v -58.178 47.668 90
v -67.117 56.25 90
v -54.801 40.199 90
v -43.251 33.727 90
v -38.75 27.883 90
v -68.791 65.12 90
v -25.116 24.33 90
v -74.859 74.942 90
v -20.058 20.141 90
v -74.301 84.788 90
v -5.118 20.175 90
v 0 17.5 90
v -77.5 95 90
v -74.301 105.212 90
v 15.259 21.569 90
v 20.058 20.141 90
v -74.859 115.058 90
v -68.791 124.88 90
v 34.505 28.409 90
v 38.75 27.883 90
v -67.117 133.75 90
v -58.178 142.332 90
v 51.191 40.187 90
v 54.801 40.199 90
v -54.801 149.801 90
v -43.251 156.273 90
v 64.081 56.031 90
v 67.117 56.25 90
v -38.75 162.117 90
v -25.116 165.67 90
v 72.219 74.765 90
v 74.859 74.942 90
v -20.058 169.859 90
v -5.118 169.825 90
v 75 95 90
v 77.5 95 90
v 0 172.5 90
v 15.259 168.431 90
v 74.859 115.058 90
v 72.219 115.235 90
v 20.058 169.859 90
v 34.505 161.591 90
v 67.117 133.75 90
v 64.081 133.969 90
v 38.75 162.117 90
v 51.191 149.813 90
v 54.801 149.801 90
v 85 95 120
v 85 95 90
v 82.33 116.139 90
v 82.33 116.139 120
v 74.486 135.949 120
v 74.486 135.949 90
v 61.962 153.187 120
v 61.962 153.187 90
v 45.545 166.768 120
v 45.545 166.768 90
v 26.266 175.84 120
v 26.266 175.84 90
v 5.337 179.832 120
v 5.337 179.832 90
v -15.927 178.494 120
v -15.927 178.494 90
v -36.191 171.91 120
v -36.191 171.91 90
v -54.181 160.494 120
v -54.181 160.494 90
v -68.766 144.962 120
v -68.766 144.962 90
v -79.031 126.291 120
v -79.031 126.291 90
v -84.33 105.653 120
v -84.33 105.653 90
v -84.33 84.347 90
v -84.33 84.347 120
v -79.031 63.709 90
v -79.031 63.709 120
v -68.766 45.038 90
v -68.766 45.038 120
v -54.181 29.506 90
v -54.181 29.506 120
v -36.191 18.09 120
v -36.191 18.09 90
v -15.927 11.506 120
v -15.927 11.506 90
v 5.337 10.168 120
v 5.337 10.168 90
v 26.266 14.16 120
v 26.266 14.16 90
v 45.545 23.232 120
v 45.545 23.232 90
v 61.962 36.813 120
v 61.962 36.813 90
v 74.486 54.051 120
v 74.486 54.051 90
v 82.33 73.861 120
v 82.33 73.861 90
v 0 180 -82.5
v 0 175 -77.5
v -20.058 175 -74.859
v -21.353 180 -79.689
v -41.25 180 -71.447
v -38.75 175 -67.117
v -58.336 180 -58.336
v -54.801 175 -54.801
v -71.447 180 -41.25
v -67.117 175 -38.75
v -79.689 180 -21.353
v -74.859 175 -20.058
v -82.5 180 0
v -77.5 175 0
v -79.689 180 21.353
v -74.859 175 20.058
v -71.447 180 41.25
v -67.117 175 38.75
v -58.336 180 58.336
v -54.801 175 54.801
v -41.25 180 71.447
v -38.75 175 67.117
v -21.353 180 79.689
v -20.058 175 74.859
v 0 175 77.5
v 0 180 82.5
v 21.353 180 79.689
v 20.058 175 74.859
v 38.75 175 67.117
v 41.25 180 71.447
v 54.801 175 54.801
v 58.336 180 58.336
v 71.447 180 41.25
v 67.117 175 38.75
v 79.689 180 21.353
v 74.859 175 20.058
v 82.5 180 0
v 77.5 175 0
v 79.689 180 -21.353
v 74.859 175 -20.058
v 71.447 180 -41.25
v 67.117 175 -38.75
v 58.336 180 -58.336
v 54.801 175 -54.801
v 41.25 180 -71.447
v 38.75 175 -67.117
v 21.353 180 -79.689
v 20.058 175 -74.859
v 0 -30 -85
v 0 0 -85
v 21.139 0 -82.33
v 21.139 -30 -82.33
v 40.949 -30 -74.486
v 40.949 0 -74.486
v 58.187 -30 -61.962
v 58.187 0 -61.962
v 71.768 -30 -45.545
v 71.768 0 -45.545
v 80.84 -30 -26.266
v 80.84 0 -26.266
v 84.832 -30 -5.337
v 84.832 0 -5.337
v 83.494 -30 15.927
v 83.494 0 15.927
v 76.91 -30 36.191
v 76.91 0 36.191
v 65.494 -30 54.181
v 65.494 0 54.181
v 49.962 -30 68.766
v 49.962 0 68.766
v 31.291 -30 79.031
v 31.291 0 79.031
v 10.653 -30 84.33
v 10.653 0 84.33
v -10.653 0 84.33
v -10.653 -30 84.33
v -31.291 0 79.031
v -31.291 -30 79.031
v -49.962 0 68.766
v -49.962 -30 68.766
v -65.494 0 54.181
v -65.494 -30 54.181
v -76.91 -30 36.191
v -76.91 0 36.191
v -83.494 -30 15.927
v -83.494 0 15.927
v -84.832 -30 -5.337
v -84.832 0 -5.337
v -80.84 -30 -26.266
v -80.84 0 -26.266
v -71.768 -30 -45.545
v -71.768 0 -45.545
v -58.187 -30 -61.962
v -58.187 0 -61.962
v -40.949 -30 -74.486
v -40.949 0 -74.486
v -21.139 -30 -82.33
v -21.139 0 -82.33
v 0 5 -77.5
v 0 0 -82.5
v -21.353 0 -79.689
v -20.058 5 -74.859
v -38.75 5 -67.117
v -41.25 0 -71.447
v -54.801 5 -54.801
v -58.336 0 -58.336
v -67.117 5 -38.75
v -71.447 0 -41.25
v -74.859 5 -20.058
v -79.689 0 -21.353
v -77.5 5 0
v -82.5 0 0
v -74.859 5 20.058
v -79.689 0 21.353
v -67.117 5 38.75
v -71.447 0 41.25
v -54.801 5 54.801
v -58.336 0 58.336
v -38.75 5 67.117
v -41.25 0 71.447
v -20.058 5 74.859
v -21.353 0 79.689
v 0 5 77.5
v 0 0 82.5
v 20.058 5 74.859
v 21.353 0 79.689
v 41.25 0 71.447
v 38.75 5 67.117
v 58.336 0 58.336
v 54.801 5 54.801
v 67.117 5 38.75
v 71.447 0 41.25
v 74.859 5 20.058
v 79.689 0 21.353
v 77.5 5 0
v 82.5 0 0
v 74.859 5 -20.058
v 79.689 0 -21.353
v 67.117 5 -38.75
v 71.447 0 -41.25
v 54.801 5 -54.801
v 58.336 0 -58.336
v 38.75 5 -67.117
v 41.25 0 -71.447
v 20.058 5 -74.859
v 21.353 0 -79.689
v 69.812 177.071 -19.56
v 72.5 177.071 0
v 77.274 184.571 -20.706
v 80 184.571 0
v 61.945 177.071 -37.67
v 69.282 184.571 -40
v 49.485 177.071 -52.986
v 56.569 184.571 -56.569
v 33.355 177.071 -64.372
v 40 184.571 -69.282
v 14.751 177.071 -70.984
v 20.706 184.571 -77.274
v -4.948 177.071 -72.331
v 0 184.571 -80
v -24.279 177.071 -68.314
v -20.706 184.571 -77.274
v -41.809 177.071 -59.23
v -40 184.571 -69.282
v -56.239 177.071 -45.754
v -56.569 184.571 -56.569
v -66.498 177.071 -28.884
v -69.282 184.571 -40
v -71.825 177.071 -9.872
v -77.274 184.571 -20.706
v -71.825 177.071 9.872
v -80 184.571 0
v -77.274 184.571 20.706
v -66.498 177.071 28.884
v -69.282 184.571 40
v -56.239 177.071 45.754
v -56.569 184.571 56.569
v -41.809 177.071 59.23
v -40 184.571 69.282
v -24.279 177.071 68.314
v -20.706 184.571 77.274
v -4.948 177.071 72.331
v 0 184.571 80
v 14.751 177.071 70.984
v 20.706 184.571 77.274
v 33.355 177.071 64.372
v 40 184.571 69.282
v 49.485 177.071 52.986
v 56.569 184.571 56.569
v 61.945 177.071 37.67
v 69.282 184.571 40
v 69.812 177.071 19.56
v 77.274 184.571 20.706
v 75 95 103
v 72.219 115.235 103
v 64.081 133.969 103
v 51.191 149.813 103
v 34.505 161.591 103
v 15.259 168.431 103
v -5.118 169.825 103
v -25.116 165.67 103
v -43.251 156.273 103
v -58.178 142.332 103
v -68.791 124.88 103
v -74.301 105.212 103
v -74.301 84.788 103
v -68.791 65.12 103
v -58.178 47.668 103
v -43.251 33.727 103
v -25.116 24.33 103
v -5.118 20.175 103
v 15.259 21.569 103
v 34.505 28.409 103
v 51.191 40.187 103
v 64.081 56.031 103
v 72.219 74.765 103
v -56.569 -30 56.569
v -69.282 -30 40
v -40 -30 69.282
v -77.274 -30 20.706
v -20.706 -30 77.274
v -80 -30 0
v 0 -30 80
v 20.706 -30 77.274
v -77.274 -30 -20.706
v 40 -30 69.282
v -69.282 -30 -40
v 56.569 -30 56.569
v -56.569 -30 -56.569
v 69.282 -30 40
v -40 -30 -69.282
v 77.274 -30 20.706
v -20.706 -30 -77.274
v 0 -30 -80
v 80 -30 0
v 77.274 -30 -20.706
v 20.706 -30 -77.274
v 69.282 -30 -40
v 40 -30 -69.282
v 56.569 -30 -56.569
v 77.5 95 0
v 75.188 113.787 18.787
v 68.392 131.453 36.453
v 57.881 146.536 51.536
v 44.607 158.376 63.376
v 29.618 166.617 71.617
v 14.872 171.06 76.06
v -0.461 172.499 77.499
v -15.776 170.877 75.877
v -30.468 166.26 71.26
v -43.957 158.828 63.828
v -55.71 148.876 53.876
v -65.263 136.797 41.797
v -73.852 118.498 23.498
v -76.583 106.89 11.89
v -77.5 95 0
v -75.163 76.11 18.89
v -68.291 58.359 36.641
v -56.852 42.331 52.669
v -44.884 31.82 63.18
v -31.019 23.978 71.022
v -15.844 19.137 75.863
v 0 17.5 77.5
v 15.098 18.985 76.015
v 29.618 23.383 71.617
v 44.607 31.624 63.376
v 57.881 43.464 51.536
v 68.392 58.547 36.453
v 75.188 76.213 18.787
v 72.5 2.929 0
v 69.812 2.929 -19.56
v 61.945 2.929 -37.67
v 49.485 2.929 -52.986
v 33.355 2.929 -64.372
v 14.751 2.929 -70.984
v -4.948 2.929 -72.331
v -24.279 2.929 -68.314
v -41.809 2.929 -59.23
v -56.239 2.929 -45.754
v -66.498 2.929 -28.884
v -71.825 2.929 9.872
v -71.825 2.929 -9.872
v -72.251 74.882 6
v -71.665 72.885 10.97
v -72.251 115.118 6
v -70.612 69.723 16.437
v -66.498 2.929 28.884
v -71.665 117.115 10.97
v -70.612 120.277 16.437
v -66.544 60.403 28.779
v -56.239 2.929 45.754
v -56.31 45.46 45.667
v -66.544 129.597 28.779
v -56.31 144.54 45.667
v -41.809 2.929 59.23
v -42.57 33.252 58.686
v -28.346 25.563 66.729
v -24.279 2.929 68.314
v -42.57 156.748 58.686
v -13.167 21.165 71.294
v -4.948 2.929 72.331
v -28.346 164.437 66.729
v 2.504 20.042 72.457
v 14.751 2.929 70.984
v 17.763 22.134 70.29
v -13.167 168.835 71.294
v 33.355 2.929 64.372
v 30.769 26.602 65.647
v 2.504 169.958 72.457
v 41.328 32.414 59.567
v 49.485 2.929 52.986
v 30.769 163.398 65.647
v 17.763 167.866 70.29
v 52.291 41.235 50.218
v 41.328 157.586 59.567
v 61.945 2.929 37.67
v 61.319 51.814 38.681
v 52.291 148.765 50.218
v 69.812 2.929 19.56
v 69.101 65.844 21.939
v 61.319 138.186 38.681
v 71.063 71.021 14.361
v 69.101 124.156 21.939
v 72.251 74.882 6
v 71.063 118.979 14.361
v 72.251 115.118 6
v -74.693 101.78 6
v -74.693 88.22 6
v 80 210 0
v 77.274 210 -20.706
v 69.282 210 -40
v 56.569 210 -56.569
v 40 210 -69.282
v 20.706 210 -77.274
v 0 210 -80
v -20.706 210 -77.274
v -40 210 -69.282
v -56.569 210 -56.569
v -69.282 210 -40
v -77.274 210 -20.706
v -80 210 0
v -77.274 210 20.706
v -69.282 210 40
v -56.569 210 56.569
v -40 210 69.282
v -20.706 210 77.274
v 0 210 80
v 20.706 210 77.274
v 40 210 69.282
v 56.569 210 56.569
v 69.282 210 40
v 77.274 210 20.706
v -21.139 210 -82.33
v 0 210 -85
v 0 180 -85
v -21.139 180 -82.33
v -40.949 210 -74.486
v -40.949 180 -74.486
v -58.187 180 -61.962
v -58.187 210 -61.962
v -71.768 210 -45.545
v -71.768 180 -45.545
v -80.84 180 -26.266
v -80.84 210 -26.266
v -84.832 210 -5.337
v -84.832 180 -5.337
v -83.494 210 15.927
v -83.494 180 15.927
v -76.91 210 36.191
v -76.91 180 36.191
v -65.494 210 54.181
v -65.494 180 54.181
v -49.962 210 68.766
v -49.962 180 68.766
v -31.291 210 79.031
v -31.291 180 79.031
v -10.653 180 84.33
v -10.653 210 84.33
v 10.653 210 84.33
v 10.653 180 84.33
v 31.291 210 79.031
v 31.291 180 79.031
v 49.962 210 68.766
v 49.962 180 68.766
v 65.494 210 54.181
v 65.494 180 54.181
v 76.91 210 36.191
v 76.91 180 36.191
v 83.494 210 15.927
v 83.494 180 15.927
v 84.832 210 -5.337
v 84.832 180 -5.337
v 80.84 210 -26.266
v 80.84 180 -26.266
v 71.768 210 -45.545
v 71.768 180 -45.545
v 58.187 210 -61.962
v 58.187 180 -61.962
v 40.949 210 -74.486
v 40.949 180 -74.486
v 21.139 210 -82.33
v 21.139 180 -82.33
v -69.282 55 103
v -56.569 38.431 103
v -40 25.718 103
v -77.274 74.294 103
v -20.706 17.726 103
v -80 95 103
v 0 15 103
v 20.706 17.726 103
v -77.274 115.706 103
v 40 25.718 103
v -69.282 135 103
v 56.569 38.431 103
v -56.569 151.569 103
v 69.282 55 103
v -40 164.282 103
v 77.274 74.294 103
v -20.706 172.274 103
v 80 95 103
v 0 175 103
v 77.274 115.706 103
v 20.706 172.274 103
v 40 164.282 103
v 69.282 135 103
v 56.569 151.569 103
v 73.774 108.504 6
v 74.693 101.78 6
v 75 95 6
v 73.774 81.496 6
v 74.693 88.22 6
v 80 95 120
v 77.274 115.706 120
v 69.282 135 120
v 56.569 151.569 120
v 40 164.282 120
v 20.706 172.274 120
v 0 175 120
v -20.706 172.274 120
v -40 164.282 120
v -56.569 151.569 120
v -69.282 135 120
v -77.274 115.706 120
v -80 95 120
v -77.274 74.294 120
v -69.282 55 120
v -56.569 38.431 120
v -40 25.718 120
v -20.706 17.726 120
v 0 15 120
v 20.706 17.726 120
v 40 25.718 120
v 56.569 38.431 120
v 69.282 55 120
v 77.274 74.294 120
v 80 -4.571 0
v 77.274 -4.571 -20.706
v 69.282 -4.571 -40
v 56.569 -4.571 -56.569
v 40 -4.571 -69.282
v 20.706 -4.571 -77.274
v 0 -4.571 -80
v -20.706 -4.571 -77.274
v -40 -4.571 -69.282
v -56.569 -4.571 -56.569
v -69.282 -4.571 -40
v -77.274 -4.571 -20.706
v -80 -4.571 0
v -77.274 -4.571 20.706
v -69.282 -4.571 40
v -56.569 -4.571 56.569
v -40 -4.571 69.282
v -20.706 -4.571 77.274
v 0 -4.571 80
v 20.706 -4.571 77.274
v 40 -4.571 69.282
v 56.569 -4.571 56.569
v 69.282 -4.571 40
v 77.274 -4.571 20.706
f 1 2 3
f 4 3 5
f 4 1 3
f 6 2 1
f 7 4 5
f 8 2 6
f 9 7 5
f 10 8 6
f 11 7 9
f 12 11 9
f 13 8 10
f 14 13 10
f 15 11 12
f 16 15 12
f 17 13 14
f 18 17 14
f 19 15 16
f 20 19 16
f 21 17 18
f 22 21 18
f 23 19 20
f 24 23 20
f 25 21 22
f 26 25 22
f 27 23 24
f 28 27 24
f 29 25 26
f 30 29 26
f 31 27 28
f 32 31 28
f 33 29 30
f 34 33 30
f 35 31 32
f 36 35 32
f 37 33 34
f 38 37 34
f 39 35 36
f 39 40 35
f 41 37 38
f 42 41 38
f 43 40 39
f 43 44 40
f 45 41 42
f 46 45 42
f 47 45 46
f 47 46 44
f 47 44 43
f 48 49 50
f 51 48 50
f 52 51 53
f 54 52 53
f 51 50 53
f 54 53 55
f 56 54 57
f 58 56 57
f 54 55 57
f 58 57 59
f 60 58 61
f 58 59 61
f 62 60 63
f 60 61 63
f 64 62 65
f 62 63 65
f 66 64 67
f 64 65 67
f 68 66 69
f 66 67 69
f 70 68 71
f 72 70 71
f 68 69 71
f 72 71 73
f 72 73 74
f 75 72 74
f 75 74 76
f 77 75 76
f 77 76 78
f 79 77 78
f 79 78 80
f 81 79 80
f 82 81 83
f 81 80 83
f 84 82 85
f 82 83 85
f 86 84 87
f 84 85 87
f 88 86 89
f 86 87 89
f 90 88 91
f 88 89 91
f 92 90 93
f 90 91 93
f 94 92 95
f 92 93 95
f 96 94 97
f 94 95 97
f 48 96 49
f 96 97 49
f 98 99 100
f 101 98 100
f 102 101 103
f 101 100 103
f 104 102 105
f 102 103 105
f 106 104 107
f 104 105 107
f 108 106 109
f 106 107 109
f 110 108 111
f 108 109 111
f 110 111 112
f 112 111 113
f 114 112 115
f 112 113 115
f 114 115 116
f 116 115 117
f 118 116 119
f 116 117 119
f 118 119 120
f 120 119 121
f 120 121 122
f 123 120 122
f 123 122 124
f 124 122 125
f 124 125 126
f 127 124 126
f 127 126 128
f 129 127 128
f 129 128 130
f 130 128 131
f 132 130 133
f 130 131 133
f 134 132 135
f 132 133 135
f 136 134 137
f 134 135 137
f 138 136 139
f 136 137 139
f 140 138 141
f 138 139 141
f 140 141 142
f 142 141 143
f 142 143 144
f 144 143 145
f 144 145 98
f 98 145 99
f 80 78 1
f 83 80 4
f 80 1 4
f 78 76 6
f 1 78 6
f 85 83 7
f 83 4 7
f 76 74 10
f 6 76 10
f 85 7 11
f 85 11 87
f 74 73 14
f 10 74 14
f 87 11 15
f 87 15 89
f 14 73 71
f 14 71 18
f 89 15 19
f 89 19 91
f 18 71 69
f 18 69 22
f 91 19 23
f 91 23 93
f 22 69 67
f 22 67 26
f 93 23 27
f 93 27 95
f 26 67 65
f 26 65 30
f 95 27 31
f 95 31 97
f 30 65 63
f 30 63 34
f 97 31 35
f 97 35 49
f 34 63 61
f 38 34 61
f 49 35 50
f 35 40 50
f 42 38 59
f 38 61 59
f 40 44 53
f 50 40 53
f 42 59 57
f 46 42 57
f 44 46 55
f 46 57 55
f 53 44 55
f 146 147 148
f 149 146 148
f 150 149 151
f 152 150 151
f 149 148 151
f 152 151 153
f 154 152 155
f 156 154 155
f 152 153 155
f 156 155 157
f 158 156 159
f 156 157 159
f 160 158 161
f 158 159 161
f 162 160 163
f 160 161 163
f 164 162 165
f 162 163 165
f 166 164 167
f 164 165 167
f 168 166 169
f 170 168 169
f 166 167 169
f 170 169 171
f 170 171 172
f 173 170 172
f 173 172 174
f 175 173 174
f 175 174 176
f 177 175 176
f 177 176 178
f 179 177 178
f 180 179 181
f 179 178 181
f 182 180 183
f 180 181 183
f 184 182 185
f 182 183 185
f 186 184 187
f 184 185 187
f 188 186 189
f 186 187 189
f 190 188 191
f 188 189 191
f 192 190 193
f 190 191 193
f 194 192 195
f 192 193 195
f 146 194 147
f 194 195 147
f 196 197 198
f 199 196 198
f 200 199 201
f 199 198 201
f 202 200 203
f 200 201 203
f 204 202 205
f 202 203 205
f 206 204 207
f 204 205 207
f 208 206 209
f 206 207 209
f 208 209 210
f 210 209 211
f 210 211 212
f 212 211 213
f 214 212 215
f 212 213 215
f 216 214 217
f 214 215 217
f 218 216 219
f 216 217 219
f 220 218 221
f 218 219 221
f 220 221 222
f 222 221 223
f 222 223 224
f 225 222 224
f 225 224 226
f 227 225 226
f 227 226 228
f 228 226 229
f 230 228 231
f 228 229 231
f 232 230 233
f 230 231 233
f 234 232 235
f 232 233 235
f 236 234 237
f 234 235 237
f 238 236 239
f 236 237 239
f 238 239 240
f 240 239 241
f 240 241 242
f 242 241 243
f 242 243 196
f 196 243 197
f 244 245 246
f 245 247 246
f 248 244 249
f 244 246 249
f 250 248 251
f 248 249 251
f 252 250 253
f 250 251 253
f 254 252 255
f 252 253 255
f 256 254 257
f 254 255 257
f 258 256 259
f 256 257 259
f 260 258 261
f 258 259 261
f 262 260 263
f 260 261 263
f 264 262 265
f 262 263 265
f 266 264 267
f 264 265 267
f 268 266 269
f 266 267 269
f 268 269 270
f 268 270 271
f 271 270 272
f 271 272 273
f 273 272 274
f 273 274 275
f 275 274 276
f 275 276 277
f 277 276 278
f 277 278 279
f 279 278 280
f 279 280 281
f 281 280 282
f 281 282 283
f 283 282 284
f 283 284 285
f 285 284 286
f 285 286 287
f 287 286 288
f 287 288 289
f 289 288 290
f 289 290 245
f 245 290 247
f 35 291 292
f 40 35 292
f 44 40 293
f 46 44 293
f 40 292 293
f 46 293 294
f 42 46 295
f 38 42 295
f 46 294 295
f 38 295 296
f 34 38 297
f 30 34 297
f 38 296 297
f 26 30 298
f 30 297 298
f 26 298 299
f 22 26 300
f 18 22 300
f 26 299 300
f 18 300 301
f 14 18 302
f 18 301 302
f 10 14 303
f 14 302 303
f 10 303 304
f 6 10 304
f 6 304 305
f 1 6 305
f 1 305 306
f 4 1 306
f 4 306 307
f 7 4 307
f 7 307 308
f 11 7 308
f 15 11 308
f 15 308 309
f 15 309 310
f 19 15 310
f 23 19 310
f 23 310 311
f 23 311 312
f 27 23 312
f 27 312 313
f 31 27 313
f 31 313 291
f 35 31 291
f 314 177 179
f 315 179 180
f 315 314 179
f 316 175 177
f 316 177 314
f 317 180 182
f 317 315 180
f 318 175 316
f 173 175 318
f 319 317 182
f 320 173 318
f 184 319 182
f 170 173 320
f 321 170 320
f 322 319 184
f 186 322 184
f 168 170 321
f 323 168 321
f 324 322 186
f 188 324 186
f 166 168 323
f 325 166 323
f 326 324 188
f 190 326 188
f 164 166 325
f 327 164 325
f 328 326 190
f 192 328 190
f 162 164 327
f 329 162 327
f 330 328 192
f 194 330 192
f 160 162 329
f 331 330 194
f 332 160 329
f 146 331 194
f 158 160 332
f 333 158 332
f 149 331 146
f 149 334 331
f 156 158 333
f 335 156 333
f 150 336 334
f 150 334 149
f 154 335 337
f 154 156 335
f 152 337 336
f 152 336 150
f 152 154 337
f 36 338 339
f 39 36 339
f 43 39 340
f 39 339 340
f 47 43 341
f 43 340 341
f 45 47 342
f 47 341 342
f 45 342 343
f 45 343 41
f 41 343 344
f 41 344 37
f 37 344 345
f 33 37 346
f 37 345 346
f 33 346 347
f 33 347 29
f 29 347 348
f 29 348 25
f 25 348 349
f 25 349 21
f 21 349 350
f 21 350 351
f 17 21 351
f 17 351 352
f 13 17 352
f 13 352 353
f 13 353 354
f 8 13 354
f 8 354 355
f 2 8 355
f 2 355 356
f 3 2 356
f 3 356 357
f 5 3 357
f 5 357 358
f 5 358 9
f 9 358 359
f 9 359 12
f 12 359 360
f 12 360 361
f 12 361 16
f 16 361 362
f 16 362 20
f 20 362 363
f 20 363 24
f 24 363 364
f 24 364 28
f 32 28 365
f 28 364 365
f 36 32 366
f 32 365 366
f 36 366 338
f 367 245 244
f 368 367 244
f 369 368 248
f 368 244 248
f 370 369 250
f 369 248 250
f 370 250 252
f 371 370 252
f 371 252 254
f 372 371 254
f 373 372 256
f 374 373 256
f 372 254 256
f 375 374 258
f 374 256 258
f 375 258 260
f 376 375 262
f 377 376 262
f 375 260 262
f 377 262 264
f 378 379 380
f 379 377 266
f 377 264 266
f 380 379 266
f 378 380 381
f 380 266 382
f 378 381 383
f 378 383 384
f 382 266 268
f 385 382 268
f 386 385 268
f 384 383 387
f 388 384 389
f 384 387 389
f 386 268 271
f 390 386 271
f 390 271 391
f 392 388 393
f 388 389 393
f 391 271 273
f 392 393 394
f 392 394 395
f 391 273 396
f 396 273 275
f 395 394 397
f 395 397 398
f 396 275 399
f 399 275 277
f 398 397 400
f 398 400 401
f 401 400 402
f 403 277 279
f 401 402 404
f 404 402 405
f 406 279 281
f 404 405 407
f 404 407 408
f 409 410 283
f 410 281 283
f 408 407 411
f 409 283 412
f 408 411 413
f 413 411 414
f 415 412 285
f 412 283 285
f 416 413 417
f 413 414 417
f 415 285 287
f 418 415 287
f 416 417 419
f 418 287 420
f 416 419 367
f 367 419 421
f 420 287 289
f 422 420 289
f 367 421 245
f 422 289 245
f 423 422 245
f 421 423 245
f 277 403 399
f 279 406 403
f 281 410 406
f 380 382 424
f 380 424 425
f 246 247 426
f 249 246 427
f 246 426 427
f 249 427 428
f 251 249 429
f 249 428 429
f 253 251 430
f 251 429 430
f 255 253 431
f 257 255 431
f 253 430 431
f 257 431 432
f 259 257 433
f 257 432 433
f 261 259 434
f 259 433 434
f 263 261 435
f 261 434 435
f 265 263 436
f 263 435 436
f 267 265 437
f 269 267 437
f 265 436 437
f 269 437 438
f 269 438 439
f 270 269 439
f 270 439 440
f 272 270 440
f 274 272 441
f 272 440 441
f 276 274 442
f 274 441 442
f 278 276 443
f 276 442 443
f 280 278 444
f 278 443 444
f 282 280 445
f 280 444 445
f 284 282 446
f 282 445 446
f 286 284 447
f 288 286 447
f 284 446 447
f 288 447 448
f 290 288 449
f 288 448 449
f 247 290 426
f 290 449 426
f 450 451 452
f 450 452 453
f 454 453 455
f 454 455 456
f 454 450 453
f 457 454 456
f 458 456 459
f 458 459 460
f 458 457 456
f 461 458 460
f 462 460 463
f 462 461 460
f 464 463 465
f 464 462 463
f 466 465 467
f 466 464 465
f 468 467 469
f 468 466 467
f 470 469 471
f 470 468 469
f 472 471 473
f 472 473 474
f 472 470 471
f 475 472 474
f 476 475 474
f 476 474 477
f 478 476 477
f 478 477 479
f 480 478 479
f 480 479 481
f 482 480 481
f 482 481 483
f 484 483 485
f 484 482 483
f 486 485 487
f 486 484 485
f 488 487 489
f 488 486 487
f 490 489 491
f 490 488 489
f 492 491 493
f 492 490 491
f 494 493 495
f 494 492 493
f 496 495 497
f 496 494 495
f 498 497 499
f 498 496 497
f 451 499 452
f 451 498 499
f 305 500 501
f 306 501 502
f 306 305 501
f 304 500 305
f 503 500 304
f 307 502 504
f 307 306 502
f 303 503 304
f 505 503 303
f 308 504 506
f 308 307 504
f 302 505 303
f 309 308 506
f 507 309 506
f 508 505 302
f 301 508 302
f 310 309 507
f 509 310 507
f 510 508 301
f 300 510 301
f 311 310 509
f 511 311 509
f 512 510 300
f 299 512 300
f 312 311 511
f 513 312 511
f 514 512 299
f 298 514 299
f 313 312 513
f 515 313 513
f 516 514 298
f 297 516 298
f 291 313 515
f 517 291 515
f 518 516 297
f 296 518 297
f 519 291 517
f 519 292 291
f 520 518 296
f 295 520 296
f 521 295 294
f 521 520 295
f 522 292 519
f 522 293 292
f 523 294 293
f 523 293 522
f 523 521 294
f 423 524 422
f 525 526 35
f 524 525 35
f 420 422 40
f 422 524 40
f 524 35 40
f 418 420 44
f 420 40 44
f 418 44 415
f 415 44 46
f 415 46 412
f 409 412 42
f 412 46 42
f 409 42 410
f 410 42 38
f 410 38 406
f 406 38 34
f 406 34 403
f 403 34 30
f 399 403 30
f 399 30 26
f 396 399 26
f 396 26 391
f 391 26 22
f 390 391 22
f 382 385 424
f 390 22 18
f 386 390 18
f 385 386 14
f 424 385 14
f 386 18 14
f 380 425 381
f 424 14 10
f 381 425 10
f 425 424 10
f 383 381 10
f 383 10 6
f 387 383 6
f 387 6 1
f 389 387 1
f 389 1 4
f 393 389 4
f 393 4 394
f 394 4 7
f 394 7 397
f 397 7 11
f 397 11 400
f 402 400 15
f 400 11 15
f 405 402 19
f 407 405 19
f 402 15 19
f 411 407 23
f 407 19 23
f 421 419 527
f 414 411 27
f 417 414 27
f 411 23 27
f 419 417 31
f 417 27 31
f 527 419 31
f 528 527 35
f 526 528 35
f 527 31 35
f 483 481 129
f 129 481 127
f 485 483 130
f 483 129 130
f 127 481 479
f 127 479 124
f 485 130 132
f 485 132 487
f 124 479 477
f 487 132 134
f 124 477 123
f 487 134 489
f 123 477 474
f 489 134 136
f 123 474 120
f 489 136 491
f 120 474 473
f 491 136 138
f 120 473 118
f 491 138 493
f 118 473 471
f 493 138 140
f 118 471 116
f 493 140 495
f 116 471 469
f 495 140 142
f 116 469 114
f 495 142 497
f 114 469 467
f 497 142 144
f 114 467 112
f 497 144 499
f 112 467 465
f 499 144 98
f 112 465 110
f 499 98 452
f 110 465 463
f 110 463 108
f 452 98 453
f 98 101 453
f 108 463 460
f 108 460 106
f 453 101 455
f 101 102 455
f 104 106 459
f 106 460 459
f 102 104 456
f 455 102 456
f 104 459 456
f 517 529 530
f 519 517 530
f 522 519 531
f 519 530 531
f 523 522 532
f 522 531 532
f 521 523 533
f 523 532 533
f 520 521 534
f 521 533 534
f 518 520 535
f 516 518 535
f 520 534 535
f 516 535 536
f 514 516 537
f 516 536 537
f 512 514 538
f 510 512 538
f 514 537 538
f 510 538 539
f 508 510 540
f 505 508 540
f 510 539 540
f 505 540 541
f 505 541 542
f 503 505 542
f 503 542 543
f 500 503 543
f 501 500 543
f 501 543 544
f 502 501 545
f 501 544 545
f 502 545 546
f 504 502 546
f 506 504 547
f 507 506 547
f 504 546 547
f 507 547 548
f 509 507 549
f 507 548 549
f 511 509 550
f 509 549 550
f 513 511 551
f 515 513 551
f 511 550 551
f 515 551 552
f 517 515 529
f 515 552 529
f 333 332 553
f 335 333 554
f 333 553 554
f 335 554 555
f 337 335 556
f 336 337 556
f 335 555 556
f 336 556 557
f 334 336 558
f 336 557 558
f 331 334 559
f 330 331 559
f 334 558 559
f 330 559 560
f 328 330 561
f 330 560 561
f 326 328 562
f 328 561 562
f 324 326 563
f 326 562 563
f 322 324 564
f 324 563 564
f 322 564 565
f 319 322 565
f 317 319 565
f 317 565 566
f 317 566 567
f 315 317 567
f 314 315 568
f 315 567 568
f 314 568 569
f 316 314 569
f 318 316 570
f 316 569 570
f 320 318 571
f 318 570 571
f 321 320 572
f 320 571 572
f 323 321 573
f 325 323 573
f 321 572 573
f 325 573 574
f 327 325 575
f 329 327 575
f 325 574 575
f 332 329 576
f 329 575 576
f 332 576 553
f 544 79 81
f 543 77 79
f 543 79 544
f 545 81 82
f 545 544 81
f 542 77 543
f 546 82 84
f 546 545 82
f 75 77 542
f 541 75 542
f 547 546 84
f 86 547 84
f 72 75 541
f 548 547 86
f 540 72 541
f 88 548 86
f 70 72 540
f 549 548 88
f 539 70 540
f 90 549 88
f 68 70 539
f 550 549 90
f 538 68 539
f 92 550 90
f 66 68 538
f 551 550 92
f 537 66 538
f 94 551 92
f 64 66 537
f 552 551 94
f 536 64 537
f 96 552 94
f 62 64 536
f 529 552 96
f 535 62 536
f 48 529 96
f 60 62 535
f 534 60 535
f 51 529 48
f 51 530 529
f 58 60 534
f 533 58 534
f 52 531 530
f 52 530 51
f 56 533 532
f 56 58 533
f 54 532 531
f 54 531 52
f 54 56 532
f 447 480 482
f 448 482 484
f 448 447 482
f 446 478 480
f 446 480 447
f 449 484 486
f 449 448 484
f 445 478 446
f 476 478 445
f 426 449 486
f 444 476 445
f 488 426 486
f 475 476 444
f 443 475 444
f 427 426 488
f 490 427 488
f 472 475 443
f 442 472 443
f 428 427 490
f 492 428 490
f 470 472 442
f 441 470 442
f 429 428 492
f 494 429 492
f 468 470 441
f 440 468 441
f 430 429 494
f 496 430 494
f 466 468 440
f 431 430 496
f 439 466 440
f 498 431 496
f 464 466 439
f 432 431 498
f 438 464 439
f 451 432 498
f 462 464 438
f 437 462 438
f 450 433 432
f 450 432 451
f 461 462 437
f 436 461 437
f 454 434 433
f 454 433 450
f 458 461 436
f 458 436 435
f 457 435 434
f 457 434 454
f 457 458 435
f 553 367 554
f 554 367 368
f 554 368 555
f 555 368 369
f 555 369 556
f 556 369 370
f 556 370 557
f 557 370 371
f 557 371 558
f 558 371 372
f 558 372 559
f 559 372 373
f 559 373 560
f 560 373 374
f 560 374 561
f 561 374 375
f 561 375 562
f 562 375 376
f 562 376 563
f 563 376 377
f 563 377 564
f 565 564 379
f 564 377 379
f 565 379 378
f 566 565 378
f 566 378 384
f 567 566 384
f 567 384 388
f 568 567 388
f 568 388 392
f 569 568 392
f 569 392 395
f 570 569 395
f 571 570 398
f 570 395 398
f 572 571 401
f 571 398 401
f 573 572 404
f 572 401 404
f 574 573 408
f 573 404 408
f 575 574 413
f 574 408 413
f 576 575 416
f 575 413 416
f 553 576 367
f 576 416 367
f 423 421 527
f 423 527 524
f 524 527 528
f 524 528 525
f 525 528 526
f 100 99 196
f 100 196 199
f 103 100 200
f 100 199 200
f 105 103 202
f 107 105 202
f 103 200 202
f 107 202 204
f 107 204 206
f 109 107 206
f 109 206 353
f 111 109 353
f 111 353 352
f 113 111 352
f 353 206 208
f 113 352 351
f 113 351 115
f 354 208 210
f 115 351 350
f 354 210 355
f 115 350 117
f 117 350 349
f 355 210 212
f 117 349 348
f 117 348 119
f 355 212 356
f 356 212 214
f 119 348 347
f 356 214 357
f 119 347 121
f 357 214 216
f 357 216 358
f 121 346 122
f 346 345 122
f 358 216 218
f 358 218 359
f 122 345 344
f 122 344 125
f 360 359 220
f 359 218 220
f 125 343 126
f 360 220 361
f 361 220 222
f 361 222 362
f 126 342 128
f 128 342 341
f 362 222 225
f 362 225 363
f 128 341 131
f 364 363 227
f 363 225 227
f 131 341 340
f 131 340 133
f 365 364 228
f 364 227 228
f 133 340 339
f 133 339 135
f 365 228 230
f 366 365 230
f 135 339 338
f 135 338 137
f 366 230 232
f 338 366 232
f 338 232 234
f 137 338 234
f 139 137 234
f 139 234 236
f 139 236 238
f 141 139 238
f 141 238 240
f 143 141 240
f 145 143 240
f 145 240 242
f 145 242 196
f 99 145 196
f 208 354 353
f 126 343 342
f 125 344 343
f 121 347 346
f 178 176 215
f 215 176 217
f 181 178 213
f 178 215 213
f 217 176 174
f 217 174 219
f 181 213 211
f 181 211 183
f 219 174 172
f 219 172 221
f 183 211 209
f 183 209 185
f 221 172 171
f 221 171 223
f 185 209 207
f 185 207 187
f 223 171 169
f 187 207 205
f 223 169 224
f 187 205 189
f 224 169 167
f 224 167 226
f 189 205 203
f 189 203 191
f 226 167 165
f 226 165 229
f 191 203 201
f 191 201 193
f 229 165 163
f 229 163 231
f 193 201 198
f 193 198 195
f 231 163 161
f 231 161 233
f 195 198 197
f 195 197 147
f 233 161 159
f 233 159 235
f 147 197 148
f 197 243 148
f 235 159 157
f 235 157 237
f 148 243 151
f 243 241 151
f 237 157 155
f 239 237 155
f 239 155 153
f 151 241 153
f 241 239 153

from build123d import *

# Parameters (mm, degrees)
SKETCH1_R            = 77.5
BOSS_EXTRUDE1_DEPTH  = 180
SKETCH2_R            = 77.5
BOSS_EXTRUDE2_DEPTH  = 90
SKETCH5_R            = 85
BOSS_EXTRUDE3_DEPTH  = 30
BOSS_EXTRUDE4_START  = 30
SKETCH6_R            = 85
BOSS_EXTRUDE4_DEPTH  = 30
SKETCH8_R            = 85
BOSS_EXTRUDE12_DEPTH = 30
SKETCH9_R            = 80
CUT_EXTRUDE1_DEPTH   = 17
SKETCH10_R           = 75
CUT_EXTRUDE2_DEPTH   = 17
CHAMFER1_SIZE        = 5
SKETCH16_R           = 75
CUT_EXTRUDE3_DEPTH   = 80


# Read off the part's stored shape, not the designer's step: Shell1
with BuildPart() as part:
    # Sketch1 → Boss-Extrude1 (new body)
    with BuildSketch(Plane(origin=(0, 0, 0), x_dir=(1, 0, 0), z_dir=(0, 1, 0))):
        with Locations(Location((0, 0, 0), (0, 0, 90))):
            Circle(SKETCH1_R)
    extrude(amount=BOSS_EXTRUDE1_DEPTH)

    # Sketch2 → Boss-Extrude2 (add)
    with BuildSketch(Plane.XY):
        with Locations((0, 95)):
            Circle(SKETCH2_R)
    extrude(amount=BOSS_EXTRUDE2_DEPTH)

    # Sketch5 → Boss-Extrude3 (add)
    with BuildSketch(Plane.XZ):
        with Locations(Location((0, 0, 0), (0, 0, 270))):
            Circle(SKETCH5_R)
    extrude(amount=BOSS_EXTRUDE3_DEPTH)

    # Sketch6 → Boss-Extrude4 (add)
    with BuildSketch(Plane(origin=(0, 180, 0), x_dir=(1, 0, 0), z_dir=(0, 1, 0)).offset(BOSS_EXTRUDE4_START)):
        with Locations(Location((0, 0, 0), (0, 0, 90))):
            Circle(SKETCH6_R)
    extrude(amount=-BOSS_EXTRUDE4_DEPTH)


with BuildPart() as body_2:
    # Sketch8 → Boss-Extrude12 (new body)
    with BuildSketch(Plane.XY.offset(90)):
        with Locations((0, 95)):
            Circle(SKETCH8_R)
    extrude(amount=BOSS_EXTRUDE12_DEPTH)

    # Sketch9 → Cut-Extrude1 (cut)
    with BuildSketch(Plane.XY.offset(120)):
        with Locations((0, 95)):
            Circle(SKETCH9_R)
    extrude(amount=-CUT_EXTRUDE1_DEPTH, mode=Mode.SUBTRACT)


with BuildPart() as cut_extrude2_tool:
    # Sketch10 → Cut-Extrude2 (new body)
    with BuildSketch(Plane.XY.offset(103)):
        with Locations((0, 95)):
            Circle(SKETCH10_R)
    extrude(amount=-CUT_EXTRUDE2_DEPTH)


with BuildPart() as part_1:
    add(part.part)

    # Cut-Extrude2: cut by cut_extrude2_tool
    add(cut_extrude2_tool.part, mode=Mode.SUBTRACT)

    # Chamfer1
    chamfer1_edges = [part_1.edges().sort_by_distance(p)[0] for p in [
        (0, 0, 77.5),
        (0, 180, 77.5),
    ]]
    chamfer(chamfer1_edges, length=CHAMFER1_SIZE)

    # Shell1 outline → Shell1 (revolve, cut)
    with BuildSketch(Plane.XY):
        Polygon((80, 210), (0, 210), (0, -30), (80, -30), (80, -4.571067812), (72.5, 2.928932188), (72.5, 177.071067812), (80, 184.571067812), align=None)
    revolve(axis=Axis((0, 0, 0), (0, 1, 0)), mode=Mode.SUBTRACT)

    # Sketch16 → Cut-Extrude3 (cut)
    with BuildSketch(Plane.XY.offset(86)):
        with Locations((0, 95)):
            Circle(SKETCH16_R)
    extrude(amount=-CUT_EXTRUDE3_DEPTH, mode=Mode.SUBTRACT)


with BuildPart() as body_2_1:
    add(body_2.part)

    # Cut-Extrude2: cut by cut_extrude2_tool
    add(cut_extrude2_tool.part, mode=Mode.SUBTRACT)


solid = Compound([part_1.part, body_2_1.part])
